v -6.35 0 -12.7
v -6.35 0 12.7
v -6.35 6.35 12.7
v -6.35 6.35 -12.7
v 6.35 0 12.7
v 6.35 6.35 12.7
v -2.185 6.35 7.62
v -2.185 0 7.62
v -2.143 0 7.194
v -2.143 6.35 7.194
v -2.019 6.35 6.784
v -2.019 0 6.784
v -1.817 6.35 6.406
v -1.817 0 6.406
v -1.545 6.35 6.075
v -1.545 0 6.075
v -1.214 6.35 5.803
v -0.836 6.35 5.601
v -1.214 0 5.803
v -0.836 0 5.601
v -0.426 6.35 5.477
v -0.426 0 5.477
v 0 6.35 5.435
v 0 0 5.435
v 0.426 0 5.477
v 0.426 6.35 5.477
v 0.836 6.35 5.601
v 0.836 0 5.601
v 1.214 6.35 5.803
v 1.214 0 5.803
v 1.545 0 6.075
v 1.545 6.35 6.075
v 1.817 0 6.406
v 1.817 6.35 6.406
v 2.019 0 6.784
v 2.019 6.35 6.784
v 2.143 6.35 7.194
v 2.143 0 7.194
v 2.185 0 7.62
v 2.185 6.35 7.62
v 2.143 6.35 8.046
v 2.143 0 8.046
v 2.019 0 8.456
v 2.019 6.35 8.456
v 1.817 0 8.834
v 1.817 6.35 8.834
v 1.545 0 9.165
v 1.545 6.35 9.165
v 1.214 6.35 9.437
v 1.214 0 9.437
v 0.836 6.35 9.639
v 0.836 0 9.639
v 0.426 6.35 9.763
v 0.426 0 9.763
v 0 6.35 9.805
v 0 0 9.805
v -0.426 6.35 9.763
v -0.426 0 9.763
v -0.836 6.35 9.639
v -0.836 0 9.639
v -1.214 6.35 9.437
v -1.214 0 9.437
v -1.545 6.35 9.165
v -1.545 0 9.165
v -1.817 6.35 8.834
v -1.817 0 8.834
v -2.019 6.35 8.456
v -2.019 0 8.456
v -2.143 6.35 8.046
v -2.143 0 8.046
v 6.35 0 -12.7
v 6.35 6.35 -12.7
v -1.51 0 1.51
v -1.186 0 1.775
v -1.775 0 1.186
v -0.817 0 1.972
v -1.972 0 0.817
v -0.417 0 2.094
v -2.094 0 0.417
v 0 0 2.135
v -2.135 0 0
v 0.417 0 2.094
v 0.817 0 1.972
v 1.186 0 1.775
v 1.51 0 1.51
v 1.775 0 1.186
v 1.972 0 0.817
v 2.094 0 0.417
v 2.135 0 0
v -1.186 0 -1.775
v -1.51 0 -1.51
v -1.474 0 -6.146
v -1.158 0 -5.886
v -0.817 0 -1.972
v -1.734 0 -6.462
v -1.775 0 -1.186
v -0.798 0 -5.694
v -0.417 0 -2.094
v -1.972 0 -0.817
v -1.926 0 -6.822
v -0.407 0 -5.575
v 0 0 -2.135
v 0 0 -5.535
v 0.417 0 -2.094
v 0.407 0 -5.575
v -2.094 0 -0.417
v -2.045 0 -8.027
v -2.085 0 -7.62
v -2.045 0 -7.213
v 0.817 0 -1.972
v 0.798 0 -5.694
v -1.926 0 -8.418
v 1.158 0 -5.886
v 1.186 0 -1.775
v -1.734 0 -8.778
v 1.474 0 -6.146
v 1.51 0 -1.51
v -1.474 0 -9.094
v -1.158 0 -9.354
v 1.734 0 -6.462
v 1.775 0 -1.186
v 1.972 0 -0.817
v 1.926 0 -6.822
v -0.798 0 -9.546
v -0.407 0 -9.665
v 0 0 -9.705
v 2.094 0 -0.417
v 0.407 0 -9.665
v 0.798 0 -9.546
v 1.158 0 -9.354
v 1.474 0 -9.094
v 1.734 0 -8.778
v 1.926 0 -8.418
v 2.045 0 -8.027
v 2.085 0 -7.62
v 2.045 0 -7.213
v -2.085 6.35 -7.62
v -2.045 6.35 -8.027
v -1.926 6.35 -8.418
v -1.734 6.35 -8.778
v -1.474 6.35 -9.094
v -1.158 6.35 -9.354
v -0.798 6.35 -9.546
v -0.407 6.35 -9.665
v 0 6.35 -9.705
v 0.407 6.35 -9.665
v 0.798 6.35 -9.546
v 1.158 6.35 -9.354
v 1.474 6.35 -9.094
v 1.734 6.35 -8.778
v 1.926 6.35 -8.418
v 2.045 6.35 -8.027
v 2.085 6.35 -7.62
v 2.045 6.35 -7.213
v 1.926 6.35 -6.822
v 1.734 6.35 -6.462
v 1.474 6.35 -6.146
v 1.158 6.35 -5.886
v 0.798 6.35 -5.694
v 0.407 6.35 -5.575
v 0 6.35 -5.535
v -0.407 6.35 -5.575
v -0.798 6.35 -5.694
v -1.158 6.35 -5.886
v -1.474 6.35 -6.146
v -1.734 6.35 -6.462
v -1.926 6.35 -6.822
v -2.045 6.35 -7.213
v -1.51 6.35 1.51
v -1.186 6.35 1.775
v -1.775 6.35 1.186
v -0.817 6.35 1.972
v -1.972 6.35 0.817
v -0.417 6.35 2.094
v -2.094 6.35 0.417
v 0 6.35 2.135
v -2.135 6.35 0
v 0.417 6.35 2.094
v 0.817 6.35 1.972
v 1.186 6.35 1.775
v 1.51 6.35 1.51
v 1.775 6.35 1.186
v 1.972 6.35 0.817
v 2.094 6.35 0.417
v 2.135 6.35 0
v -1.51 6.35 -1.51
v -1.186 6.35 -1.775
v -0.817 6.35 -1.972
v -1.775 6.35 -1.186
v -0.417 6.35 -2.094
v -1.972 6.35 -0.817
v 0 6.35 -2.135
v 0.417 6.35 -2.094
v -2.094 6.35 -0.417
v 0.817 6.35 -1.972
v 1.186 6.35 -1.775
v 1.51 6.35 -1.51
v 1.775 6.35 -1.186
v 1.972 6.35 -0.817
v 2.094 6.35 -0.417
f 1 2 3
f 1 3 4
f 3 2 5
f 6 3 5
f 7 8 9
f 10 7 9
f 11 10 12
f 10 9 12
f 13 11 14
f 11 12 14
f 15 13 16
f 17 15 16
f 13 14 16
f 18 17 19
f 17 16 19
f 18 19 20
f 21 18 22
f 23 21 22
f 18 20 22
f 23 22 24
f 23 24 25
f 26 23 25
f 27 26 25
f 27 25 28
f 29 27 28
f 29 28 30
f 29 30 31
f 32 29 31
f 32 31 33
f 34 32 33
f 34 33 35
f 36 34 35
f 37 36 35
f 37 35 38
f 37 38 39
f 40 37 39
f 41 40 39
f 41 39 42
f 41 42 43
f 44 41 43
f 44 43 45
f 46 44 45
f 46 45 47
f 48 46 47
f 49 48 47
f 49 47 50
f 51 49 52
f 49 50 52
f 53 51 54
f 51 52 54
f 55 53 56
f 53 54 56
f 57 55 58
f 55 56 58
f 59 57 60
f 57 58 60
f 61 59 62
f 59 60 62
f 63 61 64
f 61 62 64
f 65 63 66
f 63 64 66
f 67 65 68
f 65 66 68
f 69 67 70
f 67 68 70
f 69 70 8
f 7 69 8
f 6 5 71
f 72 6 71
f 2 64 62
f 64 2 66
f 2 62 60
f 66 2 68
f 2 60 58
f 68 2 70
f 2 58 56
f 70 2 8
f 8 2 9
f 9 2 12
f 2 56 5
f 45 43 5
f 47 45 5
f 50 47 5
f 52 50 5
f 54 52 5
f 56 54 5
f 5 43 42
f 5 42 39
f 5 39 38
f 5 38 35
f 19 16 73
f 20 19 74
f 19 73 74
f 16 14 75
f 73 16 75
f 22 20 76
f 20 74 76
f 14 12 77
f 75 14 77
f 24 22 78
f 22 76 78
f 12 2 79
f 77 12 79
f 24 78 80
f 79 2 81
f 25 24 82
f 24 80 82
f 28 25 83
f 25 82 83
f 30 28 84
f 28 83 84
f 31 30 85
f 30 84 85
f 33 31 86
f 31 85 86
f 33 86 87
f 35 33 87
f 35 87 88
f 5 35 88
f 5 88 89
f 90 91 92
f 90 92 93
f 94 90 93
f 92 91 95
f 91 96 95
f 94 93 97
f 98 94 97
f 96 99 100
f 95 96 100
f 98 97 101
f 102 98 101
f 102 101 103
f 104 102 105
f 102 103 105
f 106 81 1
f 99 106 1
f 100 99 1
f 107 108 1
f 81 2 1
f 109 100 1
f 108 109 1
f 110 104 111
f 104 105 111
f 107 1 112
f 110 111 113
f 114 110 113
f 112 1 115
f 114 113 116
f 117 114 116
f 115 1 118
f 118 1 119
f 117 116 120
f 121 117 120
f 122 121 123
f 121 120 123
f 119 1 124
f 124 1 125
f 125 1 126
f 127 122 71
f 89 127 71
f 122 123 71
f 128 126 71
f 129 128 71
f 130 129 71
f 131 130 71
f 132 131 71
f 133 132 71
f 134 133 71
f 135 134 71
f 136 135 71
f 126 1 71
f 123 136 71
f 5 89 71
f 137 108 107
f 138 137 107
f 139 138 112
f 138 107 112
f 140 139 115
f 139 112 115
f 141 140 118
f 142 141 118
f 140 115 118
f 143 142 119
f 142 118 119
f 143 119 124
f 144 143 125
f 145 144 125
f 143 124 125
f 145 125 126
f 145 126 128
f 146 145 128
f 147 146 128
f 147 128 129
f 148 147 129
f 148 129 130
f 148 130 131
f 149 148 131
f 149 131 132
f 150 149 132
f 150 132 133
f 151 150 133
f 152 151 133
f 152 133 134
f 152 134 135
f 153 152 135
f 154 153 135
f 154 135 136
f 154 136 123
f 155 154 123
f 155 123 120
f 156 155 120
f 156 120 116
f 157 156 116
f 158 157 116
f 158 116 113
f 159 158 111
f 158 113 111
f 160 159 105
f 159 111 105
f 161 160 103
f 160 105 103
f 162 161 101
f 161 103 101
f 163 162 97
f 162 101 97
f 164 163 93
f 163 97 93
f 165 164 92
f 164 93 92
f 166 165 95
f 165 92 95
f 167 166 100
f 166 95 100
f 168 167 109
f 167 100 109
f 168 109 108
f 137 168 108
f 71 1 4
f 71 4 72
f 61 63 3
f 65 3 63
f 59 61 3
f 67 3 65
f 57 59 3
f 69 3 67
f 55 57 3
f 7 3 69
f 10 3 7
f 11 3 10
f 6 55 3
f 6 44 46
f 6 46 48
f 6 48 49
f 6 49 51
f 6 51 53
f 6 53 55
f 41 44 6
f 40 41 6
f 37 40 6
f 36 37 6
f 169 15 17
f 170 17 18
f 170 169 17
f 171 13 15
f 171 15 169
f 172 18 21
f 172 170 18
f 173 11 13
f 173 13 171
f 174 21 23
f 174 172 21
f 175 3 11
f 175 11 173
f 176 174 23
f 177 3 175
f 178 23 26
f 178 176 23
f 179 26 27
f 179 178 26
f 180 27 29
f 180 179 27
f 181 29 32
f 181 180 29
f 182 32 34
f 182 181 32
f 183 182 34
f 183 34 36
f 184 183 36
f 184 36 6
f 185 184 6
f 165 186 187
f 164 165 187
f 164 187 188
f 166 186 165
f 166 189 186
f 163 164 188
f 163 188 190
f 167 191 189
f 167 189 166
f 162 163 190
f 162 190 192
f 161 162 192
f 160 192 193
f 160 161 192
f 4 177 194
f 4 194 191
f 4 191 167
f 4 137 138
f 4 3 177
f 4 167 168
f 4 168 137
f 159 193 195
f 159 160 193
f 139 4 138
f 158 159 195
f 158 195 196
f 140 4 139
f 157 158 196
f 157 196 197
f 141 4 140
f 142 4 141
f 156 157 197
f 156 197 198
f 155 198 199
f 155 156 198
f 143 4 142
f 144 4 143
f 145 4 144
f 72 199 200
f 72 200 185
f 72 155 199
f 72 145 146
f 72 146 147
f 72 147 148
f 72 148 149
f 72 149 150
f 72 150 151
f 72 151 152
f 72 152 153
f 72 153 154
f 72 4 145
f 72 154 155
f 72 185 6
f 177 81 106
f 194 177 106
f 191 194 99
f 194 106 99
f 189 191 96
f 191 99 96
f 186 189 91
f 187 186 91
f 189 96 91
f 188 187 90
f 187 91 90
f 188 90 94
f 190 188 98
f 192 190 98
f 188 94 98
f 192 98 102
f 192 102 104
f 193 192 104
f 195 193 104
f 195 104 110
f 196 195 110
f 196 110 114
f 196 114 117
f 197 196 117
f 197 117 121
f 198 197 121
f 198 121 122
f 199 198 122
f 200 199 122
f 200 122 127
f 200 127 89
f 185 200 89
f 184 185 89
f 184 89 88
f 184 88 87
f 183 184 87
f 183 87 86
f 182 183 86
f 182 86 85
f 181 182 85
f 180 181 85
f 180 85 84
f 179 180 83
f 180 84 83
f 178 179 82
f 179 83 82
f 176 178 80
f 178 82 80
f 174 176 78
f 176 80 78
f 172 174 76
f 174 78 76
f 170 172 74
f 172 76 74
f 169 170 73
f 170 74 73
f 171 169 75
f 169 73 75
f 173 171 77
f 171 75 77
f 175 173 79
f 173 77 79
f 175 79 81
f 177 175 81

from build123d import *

# Parameters (mm, degrees)
SKETCH1_W                   = 12.7
SKETCH1_H                   = 25.4
BOSS_EXTRUDE1_DEPTH         = 6.35
F_1_0_MM_DOWEL_HOLES1_D     = 4.17
F_1_0_MM_DOWEL_HOLES1_DEPTH = 7.874
F_1_0_MM_DOWEL_HOLES1_TIP   = 1.252794391
F_1_0_MM_DOWEL_HOLES2_D     = 4.27
F_1_0_MM_DOWEL_HOLES2_DEPTH = 7.874
F_1_0_MM_DOWEL_HOLES2_TIP   = 1.282837422
F_1_0_MM_DOWEL_HOLES3_D     = 4.37
F_1_0_MM_DOWEL_HOLES3_DEPTH = 7.874
F_1_0_MM_DOWEL_HOLES3_TIP   = 1.312880453


with BuildPart() as part:
    # Sketch1 → Boss-Extrude1 (new body)
    with BuildSketch(Plane(origin=(0, 0, 0), x_dir=(1, 0, 0), z_dir=(0, 1, 0))):
        Rectangle(SKETCH1_W, SKETCH1_H)
    extrude(amount=BOSS_EXTRUDE1_DEPTH)

    # Ø1.0 mm Dowel Holes1
    with Locations(Plane(origin=(0, 6.35, 0), x_dir=(1, 0, 0), z_dir=(0, 1, 0))):
        with Locations((0, 7.62)):
            Hole(F_1_0_MM_DOWEL_HOLES1_D / 2, depth=F_1_0_MM_DOWEL_HOLES1_DEPTH)
            with Locations((0, 0, -(F_1_0_MM_DOWEL_HOLES1_DEPTH + F_1_0_MM_DOWEL_HOLES1_TIP / 2))):  # 118° drill point
                Cone(0, F_1_0_MM_DOWEL_HOLES1_D / 2, F_1_0_MM_DOWEL_HOLES1_TIP, mode=Mode.SUBTRACT)

    # Ø1.0 mm Dowel Holes2
    with Locations(Plane(origin=(0, 6.35, 0), x_dir=(1, 0, 0), z_dir=(0, 1, 0))):
        with Locations((0, 0)):
            Hole(F_1_0_MM_DOWEL_HOLES2_D / 2, depth=F_1_0_MM_DOWEL_HOLES2_DEPTH)
            with Locations((0, 0, -(F_1_0_MM_DOWEL_HOLES2_DEPTH + F_1_0_MM_DOWEL_HOLES2_TIP / 2))):  # 118° drill point
                Cone(0, F_1_0_MM_DOWEL_HOLES2_D / 2, F_1_0_MM_DOWEL_HOLES2_TIP, mode=Mode.SUBTRACT)

    # Ø1.0 mm Dowel Holes3
    with Locations(Plane(origin=(0, 6.35, 0), x_dir=(1, 0, 0), z_dir=(0, 1, 0))):
        with Locations((0, -7.62)):
            Hole(F_1_0_MM_DOWEL_HOLES3_D / 2, depth=F_1_0_MM_DOWEL_HOLES3_DEPTH)
            with Locations((0, 0, -(F_1_0_MM_DOWEL_HOLES3_DEPTH + F_1_0_MM_DOWEL_HOLES3_TIP / 2))):  # 118° drill point
                Cone(0, F_1_0_MM_DOWEL_HOLES3_D / 2, F_1_0_MM_DOWEL_HOLES3_TIP, mode=Mode.SUBTRACT)


solid = part.part
